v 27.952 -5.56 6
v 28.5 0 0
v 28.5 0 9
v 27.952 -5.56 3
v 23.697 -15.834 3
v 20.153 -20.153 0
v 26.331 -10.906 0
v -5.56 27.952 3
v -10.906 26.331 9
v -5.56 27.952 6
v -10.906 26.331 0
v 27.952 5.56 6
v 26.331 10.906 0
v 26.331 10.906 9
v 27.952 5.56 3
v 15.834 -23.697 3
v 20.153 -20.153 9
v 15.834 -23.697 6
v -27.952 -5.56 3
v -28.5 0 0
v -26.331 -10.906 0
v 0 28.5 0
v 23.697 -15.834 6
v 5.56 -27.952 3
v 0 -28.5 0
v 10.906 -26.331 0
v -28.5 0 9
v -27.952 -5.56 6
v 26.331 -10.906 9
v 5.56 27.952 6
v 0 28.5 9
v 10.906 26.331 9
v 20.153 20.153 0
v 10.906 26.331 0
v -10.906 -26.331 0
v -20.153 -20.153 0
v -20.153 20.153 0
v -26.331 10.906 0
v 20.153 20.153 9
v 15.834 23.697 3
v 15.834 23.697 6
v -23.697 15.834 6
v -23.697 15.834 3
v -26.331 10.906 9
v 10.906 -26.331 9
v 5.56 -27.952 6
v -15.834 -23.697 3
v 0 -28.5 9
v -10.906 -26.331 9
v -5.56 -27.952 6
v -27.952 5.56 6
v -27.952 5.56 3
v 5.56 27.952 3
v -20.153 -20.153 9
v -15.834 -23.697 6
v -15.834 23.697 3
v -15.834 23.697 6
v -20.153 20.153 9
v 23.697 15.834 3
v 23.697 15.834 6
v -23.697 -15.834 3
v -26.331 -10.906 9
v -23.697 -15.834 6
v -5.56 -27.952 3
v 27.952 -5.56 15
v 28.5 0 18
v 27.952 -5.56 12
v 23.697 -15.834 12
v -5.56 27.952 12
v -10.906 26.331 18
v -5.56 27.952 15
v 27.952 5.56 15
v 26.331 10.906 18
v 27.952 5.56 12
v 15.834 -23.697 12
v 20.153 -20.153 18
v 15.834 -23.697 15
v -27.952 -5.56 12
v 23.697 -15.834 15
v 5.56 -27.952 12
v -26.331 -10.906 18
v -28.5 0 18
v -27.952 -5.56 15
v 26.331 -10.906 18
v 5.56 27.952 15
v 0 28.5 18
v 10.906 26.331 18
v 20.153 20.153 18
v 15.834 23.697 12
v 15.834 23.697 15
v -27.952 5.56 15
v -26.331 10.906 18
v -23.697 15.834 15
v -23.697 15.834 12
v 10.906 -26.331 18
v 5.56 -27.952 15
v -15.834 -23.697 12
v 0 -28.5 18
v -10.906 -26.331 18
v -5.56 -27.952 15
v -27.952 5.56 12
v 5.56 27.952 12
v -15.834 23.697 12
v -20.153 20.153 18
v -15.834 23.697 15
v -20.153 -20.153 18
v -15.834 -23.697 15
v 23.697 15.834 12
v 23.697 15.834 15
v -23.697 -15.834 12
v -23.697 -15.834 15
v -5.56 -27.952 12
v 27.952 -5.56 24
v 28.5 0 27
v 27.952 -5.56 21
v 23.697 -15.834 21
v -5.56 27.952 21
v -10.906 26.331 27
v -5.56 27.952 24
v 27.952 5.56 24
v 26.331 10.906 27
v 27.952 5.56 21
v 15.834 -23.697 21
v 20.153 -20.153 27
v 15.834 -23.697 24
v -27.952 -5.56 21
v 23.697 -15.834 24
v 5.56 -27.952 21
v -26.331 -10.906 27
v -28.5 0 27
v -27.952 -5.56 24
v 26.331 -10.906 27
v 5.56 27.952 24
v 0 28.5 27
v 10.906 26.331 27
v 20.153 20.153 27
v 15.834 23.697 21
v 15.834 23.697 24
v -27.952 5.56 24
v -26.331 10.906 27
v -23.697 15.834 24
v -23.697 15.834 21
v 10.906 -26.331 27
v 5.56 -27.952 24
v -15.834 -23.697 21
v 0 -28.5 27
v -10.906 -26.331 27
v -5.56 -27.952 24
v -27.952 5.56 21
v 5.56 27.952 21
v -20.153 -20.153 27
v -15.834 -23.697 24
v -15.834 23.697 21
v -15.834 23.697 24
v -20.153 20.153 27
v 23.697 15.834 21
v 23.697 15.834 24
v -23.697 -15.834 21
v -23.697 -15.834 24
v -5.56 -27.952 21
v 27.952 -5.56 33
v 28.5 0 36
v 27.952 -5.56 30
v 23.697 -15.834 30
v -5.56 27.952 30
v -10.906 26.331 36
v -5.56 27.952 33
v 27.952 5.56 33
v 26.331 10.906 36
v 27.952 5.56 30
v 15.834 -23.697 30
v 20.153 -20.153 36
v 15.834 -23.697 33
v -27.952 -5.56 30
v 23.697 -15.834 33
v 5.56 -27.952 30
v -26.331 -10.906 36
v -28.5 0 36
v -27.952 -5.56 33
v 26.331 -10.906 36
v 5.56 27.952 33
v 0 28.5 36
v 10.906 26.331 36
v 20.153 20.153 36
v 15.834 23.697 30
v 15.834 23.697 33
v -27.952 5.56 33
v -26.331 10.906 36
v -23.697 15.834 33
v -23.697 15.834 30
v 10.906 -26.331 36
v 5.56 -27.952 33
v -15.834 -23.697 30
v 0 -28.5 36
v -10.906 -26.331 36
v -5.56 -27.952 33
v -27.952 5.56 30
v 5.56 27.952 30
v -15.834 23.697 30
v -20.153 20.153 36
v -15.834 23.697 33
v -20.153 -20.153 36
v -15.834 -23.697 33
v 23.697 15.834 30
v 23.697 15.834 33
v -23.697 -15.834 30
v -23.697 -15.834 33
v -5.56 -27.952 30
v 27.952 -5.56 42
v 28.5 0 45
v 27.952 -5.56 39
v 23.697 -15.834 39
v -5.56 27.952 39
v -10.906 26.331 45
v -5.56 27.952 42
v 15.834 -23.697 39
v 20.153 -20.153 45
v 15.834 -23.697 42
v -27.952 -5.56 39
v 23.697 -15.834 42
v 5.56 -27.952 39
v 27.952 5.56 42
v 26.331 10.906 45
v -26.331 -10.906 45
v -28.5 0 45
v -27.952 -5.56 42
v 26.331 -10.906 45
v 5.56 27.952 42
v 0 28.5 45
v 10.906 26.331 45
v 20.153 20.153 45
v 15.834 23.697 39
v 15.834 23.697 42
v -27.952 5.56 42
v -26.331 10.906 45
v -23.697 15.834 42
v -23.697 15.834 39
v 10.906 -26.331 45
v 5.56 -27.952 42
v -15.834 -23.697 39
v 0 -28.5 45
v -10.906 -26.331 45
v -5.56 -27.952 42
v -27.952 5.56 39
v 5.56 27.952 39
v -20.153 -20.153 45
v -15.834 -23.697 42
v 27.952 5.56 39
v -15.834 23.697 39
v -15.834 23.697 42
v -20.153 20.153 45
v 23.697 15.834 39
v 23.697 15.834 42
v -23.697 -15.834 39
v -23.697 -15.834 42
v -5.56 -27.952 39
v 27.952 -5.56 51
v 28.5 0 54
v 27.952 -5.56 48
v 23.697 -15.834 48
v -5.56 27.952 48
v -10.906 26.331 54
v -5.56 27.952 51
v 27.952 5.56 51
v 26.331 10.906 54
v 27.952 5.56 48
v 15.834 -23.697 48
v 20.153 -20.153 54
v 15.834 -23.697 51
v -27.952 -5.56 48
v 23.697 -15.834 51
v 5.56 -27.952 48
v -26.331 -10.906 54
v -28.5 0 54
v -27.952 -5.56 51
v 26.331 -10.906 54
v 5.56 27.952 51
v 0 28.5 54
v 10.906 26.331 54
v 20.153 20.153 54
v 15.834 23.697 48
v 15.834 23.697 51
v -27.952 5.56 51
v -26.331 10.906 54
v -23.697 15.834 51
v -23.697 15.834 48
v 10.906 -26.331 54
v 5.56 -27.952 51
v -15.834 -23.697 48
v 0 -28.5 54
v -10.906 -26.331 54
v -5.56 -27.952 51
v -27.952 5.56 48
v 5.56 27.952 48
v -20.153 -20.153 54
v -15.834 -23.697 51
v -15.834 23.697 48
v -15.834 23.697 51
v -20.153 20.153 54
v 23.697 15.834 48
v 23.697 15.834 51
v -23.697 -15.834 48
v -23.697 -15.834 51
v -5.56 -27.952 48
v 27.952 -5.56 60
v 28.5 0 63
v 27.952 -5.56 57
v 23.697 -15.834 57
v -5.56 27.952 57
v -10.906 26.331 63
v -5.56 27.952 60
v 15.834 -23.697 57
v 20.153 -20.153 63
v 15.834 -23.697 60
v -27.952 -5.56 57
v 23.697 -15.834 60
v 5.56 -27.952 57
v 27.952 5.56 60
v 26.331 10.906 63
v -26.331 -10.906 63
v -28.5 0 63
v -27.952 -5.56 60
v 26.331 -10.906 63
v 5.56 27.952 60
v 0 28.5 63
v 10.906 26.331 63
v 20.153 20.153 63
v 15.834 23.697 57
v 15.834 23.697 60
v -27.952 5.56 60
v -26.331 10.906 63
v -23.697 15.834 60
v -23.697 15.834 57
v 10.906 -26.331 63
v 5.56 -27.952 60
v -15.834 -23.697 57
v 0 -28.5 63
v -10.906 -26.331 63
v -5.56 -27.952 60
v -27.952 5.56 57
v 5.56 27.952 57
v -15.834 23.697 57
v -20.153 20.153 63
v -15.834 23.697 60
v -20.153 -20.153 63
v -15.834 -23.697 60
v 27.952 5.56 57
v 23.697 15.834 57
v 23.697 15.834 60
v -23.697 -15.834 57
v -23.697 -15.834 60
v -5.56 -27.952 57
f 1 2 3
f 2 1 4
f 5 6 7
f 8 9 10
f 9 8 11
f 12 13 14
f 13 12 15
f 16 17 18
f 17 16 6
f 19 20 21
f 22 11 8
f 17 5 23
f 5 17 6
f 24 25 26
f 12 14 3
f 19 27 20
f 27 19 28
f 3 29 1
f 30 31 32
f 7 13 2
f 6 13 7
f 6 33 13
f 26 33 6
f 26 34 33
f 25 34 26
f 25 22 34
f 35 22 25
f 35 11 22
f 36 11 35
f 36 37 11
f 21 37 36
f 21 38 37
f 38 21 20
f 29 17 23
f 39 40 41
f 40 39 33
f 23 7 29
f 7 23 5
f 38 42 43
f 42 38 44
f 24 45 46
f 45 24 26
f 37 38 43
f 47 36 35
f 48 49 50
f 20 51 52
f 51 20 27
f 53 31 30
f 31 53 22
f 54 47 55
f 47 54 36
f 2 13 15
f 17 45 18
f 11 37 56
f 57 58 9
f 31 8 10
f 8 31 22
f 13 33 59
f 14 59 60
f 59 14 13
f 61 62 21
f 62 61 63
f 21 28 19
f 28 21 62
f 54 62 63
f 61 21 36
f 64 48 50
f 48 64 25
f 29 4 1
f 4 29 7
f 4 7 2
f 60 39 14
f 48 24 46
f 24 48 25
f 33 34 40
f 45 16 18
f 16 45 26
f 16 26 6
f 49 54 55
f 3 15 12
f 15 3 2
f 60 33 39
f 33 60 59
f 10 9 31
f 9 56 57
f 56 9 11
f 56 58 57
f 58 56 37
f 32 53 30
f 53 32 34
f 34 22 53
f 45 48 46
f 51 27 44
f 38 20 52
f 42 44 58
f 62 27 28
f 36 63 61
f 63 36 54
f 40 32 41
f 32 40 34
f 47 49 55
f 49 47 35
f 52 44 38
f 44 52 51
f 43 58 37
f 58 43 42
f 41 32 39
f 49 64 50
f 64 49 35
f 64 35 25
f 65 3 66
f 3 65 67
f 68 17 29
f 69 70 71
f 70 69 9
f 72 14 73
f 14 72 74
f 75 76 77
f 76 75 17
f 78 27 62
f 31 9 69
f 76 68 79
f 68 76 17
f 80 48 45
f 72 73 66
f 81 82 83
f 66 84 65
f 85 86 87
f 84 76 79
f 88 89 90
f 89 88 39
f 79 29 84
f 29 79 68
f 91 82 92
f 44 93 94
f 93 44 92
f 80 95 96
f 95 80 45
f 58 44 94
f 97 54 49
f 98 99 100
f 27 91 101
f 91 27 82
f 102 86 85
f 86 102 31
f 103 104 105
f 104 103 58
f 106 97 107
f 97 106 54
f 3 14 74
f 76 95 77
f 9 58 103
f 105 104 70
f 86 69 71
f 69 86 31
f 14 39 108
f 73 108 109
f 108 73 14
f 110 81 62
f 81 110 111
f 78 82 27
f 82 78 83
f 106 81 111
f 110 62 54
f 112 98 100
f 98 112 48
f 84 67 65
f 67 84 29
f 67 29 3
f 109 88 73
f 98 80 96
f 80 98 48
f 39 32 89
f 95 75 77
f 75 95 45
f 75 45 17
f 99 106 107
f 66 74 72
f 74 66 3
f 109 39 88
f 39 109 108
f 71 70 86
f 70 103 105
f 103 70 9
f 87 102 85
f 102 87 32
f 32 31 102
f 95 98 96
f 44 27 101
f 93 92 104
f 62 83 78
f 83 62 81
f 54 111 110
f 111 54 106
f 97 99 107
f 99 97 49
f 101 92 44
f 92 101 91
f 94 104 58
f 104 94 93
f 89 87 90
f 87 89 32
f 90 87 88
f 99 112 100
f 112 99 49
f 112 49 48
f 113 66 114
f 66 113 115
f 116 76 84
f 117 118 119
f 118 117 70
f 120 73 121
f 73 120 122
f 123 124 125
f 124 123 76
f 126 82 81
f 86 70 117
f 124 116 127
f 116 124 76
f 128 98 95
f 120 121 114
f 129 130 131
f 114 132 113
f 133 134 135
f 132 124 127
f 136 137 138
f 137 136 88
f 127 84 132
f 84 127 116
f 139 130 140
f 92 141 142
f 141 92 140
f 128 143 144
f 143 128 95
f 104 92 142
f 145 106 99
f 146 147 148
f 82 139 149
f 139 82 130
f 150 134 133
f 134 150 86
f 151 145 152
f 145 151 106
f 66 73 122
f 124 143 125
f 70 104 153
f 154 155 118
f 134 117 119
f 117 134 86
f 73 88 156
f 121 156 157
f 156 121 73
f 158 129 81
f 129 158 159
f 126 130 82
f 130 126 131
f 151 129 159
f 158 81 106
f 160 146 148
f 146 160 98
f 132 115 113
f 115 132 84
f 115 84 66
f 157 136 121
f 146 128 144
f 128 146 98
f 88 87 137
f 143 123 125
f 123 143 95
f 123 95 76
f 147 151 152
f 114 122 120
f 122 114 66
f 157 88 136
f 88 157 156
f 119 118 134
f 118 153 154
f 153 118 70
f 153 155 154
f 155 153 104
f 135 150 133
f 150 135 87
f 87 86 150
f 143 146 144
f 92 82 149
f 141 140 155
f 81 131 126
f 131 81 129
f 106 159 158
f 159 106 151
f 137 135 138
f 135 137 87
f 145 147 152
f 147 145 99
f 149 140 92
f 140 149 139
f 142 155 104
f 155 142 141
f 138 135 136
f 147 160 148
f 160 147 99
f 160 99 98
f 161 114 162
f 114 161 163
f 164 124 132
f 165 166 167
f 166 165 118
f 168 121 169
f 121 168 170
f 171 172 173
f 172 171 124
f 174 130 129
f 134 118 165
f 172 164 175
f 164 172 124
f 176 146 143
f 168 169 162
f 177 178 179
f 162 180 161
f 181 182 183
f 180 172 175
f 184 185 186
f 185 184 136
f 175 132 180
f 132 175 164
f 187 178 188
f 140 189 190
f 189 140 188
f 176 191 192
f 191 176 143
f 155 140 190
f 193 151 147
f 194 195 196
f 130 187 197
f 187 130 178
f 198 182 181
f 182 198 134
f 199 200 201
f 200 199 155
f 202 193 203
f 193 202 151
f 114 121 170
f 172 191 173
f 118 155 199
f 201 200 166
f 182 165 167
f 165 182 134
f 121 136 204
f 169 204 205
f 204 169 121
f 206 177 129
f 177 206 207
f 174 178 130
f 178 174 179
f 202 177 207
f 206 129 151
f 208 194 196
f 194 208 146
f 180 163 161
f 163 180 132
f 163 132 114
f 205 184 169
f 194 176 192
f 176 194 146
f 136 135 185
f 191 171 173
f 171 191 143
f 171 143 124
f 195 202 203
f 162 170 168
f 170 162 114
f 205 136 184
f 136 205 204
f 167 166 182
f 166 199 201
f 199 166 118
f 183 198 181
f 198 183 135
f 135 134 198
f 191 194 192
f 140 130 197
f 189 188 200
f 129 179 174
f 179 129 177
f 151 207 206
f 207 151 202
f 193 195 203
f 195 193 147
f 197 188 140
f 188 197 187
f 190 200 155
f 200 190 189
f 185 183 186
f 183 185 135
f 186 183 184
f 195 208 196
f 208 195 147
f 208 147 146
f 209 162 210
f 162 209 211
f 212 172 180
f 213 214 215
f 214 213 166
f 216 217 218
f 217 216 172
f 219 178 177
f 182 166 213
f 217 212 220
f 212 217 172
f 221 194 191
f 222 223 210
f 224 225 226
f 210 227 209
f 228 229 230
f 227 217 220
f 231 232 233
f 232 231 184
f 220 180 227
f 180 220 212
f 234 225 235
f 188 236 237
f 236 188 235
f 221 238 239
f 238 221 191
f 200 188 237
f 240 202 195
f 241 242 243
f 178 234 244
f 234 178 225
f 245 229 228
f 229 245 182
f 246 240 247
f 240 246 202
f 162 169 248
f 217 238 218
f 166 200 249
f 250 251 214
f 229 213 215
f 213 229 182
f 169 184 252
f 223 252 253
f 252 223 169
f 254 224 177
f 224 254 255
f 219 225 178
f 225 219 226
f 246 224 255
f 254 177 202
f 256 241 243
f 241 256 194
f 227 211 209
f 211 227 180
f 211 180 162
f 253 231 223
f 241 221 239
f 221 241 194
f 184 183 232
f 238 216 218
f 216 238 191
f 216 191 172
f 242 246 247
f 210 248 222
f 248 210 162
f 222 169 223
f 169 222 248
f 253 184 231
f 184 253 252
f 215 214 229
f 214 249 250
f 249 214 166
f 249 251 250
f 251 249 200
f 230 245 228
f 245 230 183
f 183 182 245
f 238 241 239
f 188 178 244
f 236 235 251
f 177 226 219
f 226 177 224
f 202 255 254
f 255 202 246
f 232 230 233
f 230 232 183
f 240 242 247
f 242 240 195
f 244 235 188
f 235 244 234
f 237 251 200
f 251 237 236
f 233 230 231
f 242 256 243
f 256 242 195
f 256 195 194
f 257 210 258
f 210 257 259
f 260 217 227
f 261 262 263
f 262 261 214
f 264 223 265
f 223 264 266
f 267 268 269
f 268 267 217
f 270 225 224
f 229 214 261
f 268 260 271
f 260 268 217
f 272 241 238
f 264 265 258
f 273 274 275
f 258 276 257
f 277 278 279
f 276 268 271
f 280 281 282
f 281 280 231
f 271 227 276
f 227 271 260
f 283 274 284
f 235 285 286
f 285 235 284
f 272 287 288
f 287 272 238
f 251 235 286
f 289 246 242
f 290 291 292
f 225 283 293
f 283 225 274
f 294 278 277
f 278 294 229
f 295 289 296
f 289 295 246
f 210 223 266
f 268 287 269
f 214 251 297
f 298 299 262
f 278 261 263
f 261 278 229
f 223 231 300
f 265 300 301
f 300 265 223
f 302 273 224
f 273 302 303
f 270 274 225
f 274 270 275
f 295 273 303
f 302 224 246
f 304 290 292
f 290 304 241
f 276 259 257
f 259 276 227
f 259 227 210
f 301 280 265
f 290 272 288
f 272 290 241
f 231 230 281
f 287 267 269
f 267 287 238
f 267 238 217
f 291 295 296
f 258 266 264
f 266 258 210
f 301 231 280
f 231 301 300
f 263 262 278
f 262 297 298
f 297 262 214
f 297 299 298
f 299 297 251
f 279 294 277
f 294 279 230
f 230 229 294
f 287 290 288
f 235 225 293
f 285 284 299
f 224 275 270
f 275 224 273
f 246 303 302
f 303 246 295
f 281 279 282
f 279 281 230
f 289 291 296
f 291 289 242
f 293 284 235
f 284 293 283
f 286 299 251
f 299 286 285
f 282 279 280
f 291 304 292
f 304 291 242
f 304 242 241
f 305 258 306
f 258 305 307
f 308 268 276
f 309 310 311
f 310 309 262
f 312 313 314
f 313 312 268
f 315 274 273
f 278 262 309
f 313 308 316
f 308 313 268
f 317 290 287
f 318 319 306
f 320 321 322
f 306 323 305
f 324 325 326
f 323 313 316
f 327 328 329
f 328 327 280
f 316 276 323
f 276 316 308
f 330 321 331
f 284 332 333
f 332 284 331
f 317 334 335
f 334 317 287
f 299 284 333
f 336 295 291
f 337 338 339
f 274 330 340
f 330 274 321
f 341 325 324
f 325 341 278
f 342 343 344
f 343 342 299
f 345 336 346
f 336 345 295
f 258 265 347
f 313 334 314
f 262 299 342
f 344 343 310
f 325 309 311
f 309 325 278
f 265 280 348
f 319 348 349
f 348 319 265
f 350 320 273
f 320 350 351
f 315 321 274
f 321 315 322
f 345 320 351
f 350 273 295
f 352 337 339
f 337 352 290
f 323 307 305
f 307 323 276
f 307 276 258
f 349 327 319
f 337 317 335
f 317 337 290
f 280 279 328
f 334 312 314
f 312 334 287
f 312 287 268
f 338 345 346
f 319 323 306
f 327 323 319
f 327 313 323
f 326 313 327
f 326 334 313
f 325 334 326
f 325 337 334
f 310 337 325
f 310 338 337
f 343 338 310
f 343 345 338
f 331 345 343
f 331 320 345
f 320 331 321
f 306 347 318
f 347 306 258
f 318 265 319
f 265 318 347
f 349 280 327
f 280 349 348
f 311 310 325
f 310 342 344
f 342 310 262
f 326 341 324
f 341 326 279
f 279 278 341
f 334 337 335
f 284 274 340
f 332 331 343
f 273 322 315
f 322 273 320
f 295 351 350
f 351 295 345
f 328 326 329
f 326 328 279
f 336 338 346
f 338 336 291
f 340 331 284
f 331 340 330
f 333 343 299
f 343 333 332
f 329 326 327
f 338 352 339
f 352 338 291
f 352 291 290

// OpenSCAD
sides=16;
angle=(360/sides)/2;
diam=57;
heig=3;
dist=20;

difference(){
    union(){
        for(i = [0:6]){
            translate([0,0,heig*(i*3)])
            hull(){
                cylinder(h=heig,d=diam,$fn=sides);
                
                translate([0,0,heig])
                rotate([0,0,angle])
                cylinder(h=heig,d=diam,$fn=sides);
                
                translate([0,0,heig*2])
                rotate([0,0,0])
                cylinder(h=heig,d=diam,$fn=sides);
            }

        }
    }
    
//    translate([0,0,2])
//    cylinder(h=heig*7*3-1.9, d=55, $fn=360);
    
//    for (i = [0:7]){
//        translate([sin((360/8)*i)*dist, cos((360/8)*i)*dist, -1])
//        cylinder(h=4, d=3, $fn=360);
//    }
//    
//    translate([0, 0, -1])
//    cylinder(h=4, d=10, $fn=360);
    
    
}


//translate([0,0,heig*3])
//hull(){
//    cylinder(h=heig,d=diam,$fn=sides);
//    
//    translate([0,0,heig])
//    rotate([0,0,angle])
//    cylinder(h=heig,d=diam,$fn=sides);
//    
//    translate([0,0,heig*2])
//    rotate([0,0,0])
//    cylinder(h=heig,d=diam,$fn=sides);
//}
